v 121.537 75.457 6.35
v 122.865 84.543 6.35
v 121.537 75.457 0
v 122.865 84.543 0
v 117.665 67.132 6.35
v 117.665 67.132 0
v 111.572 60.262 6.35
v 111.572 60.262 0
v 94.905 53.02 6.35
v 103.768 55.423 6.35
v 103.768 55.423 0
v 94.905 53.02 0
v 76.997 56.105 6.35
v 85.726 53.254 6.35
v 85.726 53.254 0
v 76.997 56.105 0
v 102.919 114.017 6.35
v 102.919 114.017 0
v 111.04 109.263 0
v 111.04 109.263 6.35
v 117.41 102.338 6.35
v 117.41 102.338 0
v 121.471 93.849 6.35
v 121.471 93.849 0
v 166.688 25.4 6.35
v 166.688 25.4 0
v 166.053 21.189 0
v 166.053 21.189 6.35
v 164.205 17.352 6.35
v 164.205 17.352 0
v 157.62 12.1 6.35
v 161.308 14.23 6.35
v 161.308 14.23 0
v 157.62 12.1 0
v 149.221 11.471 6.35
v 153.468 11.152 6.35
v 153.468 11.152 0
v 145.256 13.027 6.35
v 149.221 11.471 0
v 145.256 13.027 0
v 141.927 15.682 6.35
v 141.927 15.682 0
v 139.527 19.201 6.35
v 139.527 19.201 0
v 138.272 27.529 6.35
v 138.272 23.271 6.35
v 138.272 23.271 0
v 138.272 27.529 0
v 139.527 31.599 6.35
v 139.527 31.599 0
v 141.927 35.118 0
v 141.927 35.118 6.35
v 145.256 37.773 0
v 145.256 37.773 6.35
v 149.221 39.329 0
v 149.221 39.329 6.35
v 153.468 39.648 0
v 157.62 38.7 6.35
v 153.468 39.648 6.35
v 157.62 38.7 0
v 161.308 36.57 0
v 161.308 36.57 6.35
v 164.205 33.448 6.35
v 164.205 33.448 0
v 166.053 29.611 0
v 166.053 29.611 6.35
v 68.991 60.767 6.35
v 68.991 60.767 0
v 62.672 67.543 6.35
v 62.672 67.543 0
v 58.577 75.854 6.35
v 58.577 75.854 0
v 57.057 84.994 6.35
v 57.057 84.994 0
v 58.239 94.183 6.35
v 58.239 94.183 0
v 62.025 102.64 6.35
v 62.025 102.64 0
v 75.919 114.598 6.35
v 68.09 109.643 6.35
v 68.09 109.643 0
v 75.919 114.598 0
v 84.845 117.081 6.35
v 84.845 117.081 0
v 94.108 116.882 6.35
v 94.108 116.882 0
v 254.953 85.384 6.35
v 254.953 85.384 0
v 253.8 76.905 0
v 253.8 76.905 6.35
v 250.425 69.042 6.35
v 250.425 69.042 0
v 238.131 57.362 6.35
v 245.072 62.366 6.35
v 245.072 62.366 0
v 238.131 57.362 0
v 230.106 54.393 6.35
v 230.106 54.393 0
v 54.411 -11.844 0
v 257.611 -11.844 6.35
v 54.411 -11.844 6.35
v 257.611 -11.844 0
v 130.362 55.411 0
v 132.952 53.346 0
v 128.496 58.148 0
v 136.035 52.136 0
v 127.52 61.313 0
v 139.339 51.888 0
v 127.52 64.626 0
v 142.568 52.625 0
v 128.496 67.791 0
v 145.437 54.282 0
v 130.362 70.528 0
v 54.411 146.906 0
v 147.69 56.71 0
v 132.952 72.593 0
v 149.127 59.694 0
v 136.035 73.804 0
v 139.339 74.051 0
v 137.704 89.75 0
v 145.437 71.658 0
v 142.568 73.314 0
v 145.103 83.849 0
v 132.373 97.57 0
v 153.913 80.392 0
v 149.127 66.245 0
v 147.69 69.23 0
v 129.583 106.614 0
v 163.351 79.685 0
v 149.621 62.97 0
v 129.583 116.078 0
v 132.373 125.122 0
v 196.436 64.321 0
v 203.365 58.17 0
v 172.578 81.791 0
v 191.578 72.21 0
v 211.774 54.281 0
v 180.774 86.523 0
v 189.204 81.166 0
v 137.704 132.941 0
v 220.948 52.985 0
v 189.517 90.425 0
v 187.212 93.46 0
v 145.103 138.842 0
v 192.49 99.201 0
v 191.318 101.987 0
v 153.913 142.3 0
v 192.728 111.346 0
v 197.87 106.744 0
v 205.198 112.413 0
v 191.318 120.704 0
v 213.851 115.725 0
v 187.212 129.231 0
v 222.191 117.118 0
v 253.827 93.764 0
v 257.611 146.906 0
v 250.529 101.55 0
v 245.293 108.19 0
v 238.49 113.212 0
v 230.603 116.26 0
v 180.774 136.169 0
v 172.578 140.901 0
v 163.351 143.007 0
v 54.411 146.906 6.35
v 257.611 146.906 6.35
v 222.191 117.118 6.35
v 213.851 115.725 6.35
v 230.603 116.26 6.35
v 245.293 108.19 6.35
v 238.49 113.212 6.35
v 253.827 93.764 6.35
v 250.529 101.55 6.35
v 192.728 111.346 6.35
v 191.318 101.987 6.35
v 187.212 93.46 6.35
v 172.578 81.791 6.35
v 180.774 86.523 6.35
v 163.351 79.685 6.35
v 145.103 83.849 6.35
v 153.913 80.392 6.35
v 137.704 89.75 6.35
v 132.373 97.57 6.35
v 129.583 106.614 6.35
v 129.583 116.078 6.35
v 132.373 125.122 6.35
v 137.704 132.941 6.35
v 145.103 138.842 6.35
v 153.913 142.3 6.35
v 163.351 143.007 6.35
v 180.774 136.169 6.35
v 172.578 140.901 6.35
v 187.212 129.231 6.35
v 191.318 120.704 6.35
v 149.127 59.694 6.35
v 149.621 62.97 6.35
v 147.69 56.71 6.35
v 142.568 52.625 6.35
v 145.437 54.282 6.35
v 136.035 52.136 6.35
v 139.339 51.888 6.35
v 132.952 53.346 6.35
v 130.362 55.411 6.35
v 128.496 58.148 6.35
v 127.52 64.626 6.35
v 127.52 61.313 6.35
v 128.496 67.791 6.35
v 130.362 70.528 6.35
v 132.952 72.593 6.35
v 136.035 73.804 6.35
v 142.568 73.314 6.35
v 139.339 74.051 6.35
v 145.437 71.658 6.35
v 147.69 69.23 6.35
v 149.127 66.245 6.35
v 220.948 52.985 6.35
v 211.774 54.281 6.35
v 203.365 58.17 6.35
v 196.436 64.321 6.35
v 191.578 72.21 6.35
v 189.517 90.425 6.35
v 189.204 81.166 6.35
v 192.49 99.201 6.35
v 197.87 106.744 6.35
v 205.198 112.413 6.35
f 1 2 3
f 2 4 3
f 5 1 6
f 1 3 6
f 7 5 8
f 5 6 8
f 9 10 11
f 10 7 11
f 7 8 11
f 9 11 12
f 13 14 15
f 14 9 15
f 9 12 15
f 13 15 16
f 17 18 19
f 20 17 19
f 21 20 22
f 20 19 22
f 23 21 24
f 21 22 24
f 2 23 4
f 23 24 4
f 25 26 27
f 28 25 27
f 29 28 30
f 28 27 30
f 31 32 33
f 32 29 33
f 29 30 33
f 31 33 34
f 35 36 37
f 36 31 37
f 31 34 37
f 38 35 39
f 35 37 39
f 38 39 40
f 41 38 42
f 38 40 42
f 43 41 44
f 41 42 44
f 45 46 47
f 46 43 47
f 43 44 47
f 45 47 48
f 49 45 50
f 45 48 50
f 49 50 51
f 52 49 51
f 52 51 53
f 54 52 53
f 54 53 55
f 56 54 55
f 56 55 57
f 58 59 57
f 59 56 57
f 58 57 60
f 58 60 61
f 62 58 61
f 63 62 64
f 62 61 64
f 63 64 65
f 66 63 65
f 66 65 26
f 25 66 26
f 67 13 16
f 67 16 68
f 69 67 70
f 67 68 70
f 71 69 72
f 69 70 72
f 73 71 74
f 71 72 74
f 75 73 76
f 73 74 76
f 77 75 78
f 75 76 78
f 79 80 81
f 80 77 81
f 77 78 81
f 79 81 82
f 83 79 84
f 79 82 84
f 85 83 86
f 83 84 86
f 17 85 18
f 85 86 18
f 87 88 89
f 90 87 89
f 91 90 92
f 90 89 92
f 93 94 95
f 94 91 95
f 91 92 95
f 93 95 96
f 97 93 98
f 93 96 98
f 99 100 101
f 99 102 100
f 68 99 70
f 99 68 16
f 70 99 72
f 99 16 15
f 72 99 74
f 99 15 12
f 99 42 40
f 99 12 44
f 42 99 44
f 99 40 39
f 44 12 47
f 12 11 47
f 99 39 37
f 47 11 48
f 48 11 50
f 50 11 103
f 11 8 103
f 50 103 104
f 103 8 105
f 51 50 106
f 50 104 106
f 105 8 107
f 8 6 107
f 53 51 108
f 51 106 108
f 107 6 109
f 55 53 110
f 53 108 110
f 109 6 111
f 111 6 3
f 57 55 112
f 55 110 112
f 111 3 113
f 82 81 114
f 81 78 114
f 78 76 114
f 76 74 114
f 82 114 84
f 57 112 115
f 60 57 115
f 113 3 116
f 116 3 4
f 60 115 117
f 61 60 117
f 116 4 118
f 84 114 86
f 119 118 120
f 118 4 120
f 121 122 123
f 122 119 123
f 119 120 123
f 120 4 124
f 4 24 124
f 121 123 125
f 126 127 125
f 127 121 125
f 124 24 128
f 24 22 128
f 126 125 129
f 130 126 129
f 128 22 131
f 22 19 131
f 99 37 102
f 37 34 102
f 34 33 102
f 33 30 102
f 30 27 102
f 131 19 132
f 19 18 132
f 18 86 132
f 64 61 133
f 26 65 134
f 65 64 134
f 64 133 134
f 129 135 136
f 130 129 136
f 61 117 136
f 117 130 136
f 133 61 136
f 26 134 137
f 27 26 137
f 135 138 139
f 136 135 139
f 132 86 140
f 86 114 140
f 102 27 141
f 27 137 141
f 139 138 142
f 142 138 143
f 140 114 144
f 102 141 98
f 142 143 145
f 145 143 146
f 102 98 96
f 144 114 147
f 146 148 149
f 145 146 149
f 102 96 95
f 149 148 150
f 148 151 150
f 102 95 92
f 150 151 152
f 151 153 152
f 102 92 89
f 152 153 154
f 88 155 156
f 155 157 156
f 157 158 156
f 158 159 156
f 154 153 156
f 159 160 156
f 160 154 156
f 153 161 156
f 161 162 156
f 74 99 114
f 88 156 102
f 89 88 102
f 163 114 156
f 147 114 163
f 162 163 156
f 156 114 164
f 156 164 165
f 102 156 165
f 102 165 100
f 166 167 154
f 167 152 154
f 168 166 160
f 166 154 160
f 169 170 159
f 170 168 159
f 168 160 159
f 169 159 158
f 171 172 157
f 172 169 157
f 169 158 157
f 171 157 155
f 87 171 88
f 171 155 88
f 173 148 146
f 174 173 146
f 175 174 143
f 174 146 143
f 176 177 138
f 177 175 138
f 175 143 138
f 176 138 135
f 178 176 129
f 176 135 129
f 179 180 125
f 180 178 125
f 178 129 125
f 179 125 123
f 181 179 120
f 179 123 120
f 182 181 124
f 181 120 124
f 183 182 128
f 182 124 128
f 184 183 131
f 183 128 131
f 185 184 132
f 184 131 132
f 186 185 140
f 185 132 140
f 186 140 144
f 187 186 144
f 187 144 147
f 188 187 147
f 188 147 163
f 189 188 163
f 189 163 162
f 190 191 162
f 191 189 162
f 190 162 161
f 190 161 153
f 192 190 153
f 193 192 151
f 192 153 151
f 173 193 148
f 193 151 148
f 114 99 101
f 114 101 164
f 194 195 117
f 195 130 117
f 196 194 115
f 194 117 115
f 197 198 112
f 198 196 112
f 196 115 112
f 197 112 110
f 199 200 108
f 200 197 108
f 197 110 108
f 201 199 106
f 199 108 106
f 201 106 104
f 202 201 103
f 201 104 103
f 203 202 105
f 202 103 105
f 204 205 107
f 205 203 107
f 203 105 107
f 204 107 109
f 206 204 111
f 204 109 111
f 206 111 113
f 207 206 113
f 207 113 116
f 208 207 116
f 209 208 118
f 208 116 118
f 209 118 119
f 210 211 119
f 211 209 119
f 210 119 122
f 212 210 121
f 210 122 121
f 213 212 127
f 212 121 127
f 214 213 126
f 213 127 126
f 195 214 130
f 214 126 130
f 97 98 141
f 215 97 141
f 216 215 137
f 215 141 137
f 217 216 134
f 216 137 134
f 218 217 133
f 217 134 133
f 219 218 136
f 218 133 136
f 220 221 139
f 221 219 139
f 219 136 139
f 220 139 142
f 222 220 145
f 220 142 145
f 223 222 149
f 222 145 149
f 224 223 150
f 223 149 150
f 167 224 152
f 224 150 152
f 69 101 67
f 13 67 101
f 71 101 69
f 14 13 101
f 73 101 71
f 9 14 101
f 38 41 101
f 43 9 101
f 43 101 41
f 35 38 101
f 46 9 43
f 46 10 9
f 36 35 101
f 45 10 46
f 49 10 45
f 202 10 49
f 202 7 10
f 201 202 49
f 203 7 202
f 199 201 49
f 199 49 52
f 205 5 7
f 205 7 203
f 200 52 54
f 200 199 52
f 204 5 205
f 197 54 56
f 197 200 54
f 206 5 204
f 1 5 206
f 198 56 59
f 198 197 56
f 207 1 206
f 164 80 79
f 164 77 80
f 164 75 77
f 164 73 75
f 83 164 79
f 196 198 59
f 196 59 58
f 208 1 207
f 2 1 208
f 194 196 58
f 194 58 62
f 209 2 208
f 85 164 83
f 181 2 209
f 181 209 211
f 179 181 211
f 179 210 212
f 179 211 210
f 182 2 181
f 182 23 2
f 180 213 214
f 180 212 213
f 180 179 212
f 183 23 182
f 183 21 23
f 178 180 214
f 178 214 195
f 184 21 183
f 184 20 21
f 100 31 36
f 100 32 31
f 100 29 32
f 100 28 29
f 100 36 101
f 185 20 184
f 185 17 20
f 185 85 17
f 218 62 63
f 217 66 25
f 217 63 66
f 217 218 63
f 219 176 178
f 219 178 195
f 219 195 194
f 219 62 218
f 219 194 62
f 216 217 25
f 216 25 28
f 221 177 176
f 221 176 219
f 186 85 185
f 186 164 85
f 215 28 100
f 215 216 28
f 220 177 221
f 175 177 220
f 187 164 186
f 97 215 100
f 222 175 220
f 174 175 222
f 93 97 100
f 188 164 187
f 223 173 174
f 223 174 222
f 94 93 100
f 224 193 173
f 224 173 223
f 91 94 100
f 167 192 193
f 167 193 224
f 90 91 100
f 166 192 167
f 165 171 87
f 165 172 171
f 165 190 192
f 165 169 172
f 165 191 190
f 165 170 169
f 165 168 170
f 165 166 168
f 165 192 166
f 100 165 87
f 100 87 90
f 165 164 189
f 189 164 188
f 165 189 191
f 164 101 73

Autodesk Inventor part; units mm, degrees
ref_plane "YZ Plane" through (0, 0, 0) normal (1, 0, 0) x (0, 1, 0)
ref_plane "XZ Plane" through (0, 0, 0) normal (0, 1, 0) x (-1, 0, 0)
ref_plane "XY Plane" through (0, 0, 0) normal (0, 0, 1) x (1, 0, 0)
sketch "Sketch1" plane through (0, 0, 0) normal (0, 0, 1) x (1, 0, 0)
  line L0 (0, 0) -> (304.8, 0) construction
  line L1 (304.8, 0) -> (304.8, 50.8) construction
  line L2 (304.8, 50.8) -> (0, 50.8) construction
  line L3 (0, 50.8) -> (0, 0) construction
  circle A0 centre (152.4, 25.4) radius 14.2875
  circle A1 centre (152.4, 25.4) radius 30.48 construction
  circle A2 centre (152.4, 25.4) radius 22.225 construction
  line L4 (152.4, 25.4) -> (138.508178, 62.969727) construction
  circle A3 centre (138.508178, 62.969727) radius 9.525 construction
  circle A4 centre (138.508178, 62.969727) radius 17.78 construction
  circle A5 centre (89.971088, 85.09) radius 31.75 construction
  circle A6 centre (160.978478, 111.345767) radius 31.75
  circle A7 centre (221.970096, 85.09) radius 31.75 construction
  line L5 (0, 50.8) -> (0, 53.34) construction
  line L6 (0, 53.34) -> (304.8, 53.34) construction
  line L7 (304.8, 53.34) -> (304.8, 50.8) construction
  circle A8 centre (138.508178, 62.969727) radius 21.59 construction
  circle A9 centre (152.4, 25.4) radius 46.99 construction
  circle A10 centre (152.4, 25.4) radius 50.8 construction
  arc A11 (84.94082, 79.326416) -> (90.918413, 92.681118) centre (89.971088, 85.09) ccw construction
  circle A12 centre (160.978478, 111.345767) radius 7.65 construction
  arc A13 (221.694578, 92.735037) -> (225.517168, 78.312037) centre (221.970096, 85.09) ccw construction
  circle A14 centre (160.978478, 111.345767) radius 9.1 construction
  circle A15 centre (138.508178, 62.969727) radius 22.9 construction
  line L8 (84.94082, 79.326416) -> (123.450252, 45.716644) construction
  line L9 (168.548316, 110.241211) -> (161.168218, 59.663279) construction
  line L10 (90.918413, 92.681118) -> (89.971088, 85.09) construction
  line L11 (89.971088, 85.09) -> (84.94082, 79.326416) construction
  circle A16 centre (126.19198, 96.27826) radius 3.175 construction
  circle A17 centre (126.19198, 96.27826) radius 7.9375 construction
  line L12 (90.918413, 92.681118) -> (125.209053, 88.401855) construction
  line L13 (132.062639, 90.936044) -> (155.320457, 116.494485) construction
  line L14 (155.320457, 116.494485) -> (160.978478, 111.345767) construction
  line L15 (168.548316, 110.241211) -> (160.978478, 111.345767) construction
  line L16 (138.508178, 62.969727) -> (126.19198, 96.27826) construction
  line L17 (89.971088, 85.09) -> (160.978478, 111.345767) construction
  line L18 (152.4, 25.4) -> (89.971088, 85.09) construction
  line L19 (152.4, 25.4) -> (160.978478, 111.345767) construction
  circle A18 centre (126.19198, 96.27826) radius 9.2075 construction
  circle A19 centre (126.19198, 96.27826) radius 6.1595 construction
  arc A20 (90.918413, 92.681118) -> (84.94082, 79.326416) centre (89.971088, 85.09) ccw construction
  circle A21 centre (160.978478, 111.345767) radius 25.4 construction
  circle A22 centre (221.970096, 85.09) radius 25.4 construction
  line L20 (102.942353, 114.069454) -> (76.999823, 56.110546) construction
  circle A23 centre (89.971088, 85.09) radius 25.4 construction
  line L21 (213.836088, 115.780396) -> (230.104105, 54.399604) construction
  line L22 (54.411088, 146.905767) -> (257.611088, 146.905767)
  line L23 (257.611088, 146.905767) -> (257.611088, -11.844233)
  line L24 (257.611088, -11.844233) -> (54.411088, -11.844233)
  line L25 (54.411088, -11.844233) -> (54.411088, 146.905767)
  circle A24 centre (138.508178, 62.969727) radius 11.1125
  arc A25 (225.312875, 75.445533) -> (221.093638, 95.322667) centre (223.203256, 85.3841) ccw construction
  line L26 (220.753147, 84.734737) -> (228.477303, 60.537683) construction
  line L27 (223.203256, 85.3841) -> (228.477303, 60.537683) construction
  line L28 (220.753147, 84.734737) -> (213.028991, 108.931791) construction
  line L29 (223.203256, 85.3841) -> (217.92921, 110.230517) construction
  arc A26 (212.304851, 111.200264) -> (213.75313, 106.663317) centre (213.028991, 108.931791) ccw construction
  arc A27 (218.423652, 107.901165) -> (217.434768, 112.559869) centre (217.92921, 110.230517) ccw construction
  arc A28 (218.423652, 107.901165) -> (213.75313, 106.663317) centre (228.477303, 60.537683) ccw construction
  arc A29 (217.434768, 112.559869) -> (212.304851, 111.200264) centre (228.477303, 60.537683) ccw construction
  line L30 (213.028991, 108.931791) -> (212.304851, 111.200264) construction
  line L31 (217.92921, 110.230517) -> (217.434768, 112.559869) construction
  arc A30 (221.093638, 95.322667) -> (217.663484, 94.413558) centre (228.477303, 60.537683) ccw construction
  arc A31 (225.312875, 75.445533) -> (223.842809, 75.055915) centre (228.477303, 60.537683) ccw construction
  line L32 (102.635769, 107.180274) -> (91.114923, 84.543355) construction
  line L33 (79.594076, 61.906436) -> (88.801403, 85.578892) construction
  arc A32 (98.871917, 111.470639) -> (97.145543, 107.032054) centre (98.00873, 109.251347) ccw construction
  arc A33 (101.55569, 105.058063) -> (103.715849, 109.302485) centre (102.635769, 107.180274) ccw construction
  arc A34 (101.55569, 105.058063) -> (97.145543, 107.032054) centre (79.594076, 61.906436) ccw construction
  line L34 (98.00873, 109.251347) -> (98.871917, 111.470639) construction
  line L35 (102.635769, 107.180274) -> (103.715849, 109.302485) construction
  arc A35 (103.715849, 109.302485) -> (98.871917, 111.470639) centre (79.594076, 61.906436) ccw construction
  arc A36 (217.663484, 94.413558) -> (223.842809, 75.055915) centre (220.753147, 84.734737) ccw construction
  arc A37 (86.506584, 75.488588) -> (95.723261, 93.598123) centre (91.114923, 84.543355) ccw construction
  line L36 (88.801403, 85.578892) -> (98.00873, 109.251347) construction
  line L37 (91.114923, 84.543355) -> (79.594076, 61.906436) construction
  arc A38 (86.506584, 75.488588) -> (85.118472, 76.10991) centre (79.594076, 61.906436) ccw construction
  arc A39 (95.723261, 93.598123) -> (92.484334, 95.047874) centre (79.594076, 61.906436) ccw construction
  arc A40 (92.484334, 95.047874) -> (85.118472, 76.10991) centre (88.801403, 85.578892) ccw construction
  line L38 (160.978478, 111.345767) -> (138.015112, 122.201357) construction
  line L39 (160.978478, 111.345767) -> (183.941843, 100.490177) construction
  circle A41 centre (138.508178, 62.969727) radius 26.75 construction
  line L40 (221.694578, 92.735037) -> (137.544764, 89.702373) construction
  line L41 (225.517168, 78.312037) -> (150.911337, 39.269007) construction
  line L42 (221.970096, 85.09) -> (221.694578, 92.735037) construction
  line L43 (221.970096, 85.09) -> (225.517168, 78.312037) construction
  line L44 (138.508178, 62.969727) -> (137.544764, 89.702373) construction
  line L45 (138.508178, 62.969727) -> (150.911337, 39.269007) construction
  arc A42 (225.517168, 78.312037) -> (221.694578, 92.735037) centre (221.970096, 85.09) ccw construction
  arc A43 (225.517168, 78.312037) -> (224.776319, 77.973286) centre (221.970096, 85.09) ccw construction
  line L46 (138.508178, 62.969727) -> (221.970096, 85.09) construction
  circle A44 centre (88.801403, 85.578892) radius 31.75
  circle A45 centre (91.114923, 84.543355) radius 31.75
  line L47 (98.871917, 111.470639) -> (100.310562, 115.16946) construction
  line L48 (103.715849, 109.302485) -> (105.515981, 112.839504) construction
  arc A46 (105.515981, 112.839504) -> (100.310562, 115.16946) centre (79.594076, 61.906436) ccw
  circle A47 centre (220.753147, 84.734737) radius 31.75
  circle A48 centre (223.203256, 85.3841) radius 31.75
  line L49 (212.304851, 111.200264) -> (211.097951, 114.981054) construction
  line L50 (217.434768, 112.559869) -> (216.610698, 116.442121) construction
  arc A49 (216.610698, 116.442121) -> (211.097951, 114.981054) centre (228.477303, 60.537683) ccw
  point P0 (215.46289, 109.642317)
  point P1 (100.3481, 108.273564)
  dimension "d114" = 63.5
  dimension "d115" = 63.5
  dimension "d122" = 63.5
  dimension "d123" = 63.5
  dimension "d1" = 50.8
  dimension "d2" = 28.575
  dimension "d3" = 25.4
  dimension "d4" = 152.4
  dimension "d7" = 60.96
  dimension "d8" = 44.45
  dimension "d9" = 19.05
  dimension "d10" = 35.56
  dimension "d11" = 40.0558
  dimension "d12" = 63.5
  dimension "d13" = 63.5
  dimension "d14" = 63.5
  dimension "d15" = 2.54
  dimension "d16" = 304.8
  dimension "d17" = 43.18
  dimension "d18" = 93.98
  dimension "d19" = 101.6
  dimension "d21" = 15.3
  dimension "d22" = 15.3
  dimension "d24" = 18.2
  dimension "d29" = 45.8
  dimension "d30" = 146
  dimension "d31" = 6.35
  dimension "d32" = 15.875
  dimension "d33" = 146
  dimension "d35" = 18.415
  dimension "d37" = 12.319
  dimension "d40" = 50.8
  dimension "d41" = 50.8
  dimension "d42" = 17
  dimension "d43" = 17
  dimension "d44" = 50.8
  dimension "d53" = 203.2
  dimension "d54" = 158.75
  dimension "d55" = 35.56
  dimension "d56" = 35.56
  dimension "d57" = 22.225
  dimension "d67" = 25.4
  dimension "d68" = 25.4
  dimension "d69" = 2.86
  dimension "d70" = 25.4
  dimension "d71" = 25.4
  dimension "d72" = 4.7625
  dimension "d75" = 2.86
  dimension "d80" = 4.7625
  dimension "d82" = 4.7625
  dimension "d83" = 50.8
  dimension "d84" = 50.8
  dimension "d85" = 10.16
  dimension "d97" = 48.41875
  dimension "d99" = 20.32
  dimension "d101" = 25.4
  dimension "d102" = 25.4
  dimension "d103" = 10.16
  dimension "d105" = 17
  dimension "d106" = 17
  dimension "d107" = 53.5
  dimension "d108" = 154.44
  dimension "d109" = 7.65
  dimension "d111" = 86.34349
  dimension "d112" = 12.7801
  dimension "d113" = 12.7801
  dimension "d116" = 57.15
sketch "Sketch1 outline for Extrusion3" plane through (0, 0, 0) normal (0, 0, 1) x (1, 0, 0)
  line L0 (54.411088, 146.905767) -> (257.611088, 146.905767)
  line L1 (54.411088, -11.844233) -> (54.411088, 146.905767)
  line L2 (257.611088, 146.905767) -> (257.611088, -11.844233)
  line L3 (257.611088, -11.844233) -> (54.411088, -11.844233)
  circle A0 centre (152.4, 25.4) radius 14.2875
  circle A1 centre (138.508178, 62.969727) radius 11.1125
  arc A2 (122.864923, 84.543355) -> (102.91909, 114.017482) centre (91.114923, 84.543355) ccw
  arc A3 (102.91909, 114.017482) -> (76.997235, 56.104765) centre (88.801403, 85.578892) ccw
  arc A4 (76.997235, 56.104765) -> (122.864923, 84.543355) centre (91.114923, 84.543355) ccw
  arc A5 (254.953256, 85.3841) -> (213.850676, 115.725355) centre (223.203256, 85.3841) ccw
  arc A6 (213.850676, 115.725355) -> (230.105727, 54.393482) centre (220.753147, 84.734737) ccw
  arc A7 (230.105727, 54.393482) -> (254.953256, 85.3841) centre (223.203256, 85.3841) ccw
  circle A8 centre (160.978478, 111.345767) radius 31.75
extrude "Extrusion3" add sketch "Sketch1 outline for Extrusion3" along normal blind 6.35
equation "\"d2\" = BearingLargeOD"
equation "\"d7\" = Gear48tPD"
equation "\"d8\" = Gear35tPD"
equation "\"d9\" = Gear15tPD"
equation "\"d10\" = Gear28tPD"
equation "\"d11\" = 0.5 * Gear48tPD + 0.5 * Gear15tPD + MeshingClearance"
equation "\"d12\" = CimOD"
equation "\"d13\" = CimOD"
equation "\"d14\" = CimOD"
equation "\"d17\" = Gear28tPD + ClearanceDiameter"
equation "\"d18\" = WheelOD"
equation "\"d19\" = WheelClearance"
equation "\"Pulley48tPD\" = 45.8"
equation "\"Pulley19tPD\" = 18.2"
equation "\"Pulley16tPD\" = 15.3"
equation "\"Gear15tPD\" = 19.05"
equation "\"Gear35tPD\" = 44.45"
equation "\"Gear48tPD\" = 60.96"
equation "\"Gear28tPD\" = 35.56"
equation "\"BearingLargeOD\" = 28.575"
equation "\"BearingSmallOD\" = 22.225"
equation "\"MeshingClearance\" = 0.0508"
equation "\"CimOD\" = 63.5"
equation "\"WheelOD\" = 93.98"
equation "\"ClearanceDiameter\" = 7.62"
equation "\"WheelClearance\" = 101.6"
equation "\"TensioningBearingID\" = 6.35"
equation "\"TensioningBearingOD\" = 15.875"
equation "\"SpingClipClearance\" = 8.89"
equation "\"Pi\" = 79.79645"
equation "\"Pulley56tPD\" = 53.5"
equation "\"BearingXLargeOD\" = 34.925"
properties part number "OutlineSketch1"
